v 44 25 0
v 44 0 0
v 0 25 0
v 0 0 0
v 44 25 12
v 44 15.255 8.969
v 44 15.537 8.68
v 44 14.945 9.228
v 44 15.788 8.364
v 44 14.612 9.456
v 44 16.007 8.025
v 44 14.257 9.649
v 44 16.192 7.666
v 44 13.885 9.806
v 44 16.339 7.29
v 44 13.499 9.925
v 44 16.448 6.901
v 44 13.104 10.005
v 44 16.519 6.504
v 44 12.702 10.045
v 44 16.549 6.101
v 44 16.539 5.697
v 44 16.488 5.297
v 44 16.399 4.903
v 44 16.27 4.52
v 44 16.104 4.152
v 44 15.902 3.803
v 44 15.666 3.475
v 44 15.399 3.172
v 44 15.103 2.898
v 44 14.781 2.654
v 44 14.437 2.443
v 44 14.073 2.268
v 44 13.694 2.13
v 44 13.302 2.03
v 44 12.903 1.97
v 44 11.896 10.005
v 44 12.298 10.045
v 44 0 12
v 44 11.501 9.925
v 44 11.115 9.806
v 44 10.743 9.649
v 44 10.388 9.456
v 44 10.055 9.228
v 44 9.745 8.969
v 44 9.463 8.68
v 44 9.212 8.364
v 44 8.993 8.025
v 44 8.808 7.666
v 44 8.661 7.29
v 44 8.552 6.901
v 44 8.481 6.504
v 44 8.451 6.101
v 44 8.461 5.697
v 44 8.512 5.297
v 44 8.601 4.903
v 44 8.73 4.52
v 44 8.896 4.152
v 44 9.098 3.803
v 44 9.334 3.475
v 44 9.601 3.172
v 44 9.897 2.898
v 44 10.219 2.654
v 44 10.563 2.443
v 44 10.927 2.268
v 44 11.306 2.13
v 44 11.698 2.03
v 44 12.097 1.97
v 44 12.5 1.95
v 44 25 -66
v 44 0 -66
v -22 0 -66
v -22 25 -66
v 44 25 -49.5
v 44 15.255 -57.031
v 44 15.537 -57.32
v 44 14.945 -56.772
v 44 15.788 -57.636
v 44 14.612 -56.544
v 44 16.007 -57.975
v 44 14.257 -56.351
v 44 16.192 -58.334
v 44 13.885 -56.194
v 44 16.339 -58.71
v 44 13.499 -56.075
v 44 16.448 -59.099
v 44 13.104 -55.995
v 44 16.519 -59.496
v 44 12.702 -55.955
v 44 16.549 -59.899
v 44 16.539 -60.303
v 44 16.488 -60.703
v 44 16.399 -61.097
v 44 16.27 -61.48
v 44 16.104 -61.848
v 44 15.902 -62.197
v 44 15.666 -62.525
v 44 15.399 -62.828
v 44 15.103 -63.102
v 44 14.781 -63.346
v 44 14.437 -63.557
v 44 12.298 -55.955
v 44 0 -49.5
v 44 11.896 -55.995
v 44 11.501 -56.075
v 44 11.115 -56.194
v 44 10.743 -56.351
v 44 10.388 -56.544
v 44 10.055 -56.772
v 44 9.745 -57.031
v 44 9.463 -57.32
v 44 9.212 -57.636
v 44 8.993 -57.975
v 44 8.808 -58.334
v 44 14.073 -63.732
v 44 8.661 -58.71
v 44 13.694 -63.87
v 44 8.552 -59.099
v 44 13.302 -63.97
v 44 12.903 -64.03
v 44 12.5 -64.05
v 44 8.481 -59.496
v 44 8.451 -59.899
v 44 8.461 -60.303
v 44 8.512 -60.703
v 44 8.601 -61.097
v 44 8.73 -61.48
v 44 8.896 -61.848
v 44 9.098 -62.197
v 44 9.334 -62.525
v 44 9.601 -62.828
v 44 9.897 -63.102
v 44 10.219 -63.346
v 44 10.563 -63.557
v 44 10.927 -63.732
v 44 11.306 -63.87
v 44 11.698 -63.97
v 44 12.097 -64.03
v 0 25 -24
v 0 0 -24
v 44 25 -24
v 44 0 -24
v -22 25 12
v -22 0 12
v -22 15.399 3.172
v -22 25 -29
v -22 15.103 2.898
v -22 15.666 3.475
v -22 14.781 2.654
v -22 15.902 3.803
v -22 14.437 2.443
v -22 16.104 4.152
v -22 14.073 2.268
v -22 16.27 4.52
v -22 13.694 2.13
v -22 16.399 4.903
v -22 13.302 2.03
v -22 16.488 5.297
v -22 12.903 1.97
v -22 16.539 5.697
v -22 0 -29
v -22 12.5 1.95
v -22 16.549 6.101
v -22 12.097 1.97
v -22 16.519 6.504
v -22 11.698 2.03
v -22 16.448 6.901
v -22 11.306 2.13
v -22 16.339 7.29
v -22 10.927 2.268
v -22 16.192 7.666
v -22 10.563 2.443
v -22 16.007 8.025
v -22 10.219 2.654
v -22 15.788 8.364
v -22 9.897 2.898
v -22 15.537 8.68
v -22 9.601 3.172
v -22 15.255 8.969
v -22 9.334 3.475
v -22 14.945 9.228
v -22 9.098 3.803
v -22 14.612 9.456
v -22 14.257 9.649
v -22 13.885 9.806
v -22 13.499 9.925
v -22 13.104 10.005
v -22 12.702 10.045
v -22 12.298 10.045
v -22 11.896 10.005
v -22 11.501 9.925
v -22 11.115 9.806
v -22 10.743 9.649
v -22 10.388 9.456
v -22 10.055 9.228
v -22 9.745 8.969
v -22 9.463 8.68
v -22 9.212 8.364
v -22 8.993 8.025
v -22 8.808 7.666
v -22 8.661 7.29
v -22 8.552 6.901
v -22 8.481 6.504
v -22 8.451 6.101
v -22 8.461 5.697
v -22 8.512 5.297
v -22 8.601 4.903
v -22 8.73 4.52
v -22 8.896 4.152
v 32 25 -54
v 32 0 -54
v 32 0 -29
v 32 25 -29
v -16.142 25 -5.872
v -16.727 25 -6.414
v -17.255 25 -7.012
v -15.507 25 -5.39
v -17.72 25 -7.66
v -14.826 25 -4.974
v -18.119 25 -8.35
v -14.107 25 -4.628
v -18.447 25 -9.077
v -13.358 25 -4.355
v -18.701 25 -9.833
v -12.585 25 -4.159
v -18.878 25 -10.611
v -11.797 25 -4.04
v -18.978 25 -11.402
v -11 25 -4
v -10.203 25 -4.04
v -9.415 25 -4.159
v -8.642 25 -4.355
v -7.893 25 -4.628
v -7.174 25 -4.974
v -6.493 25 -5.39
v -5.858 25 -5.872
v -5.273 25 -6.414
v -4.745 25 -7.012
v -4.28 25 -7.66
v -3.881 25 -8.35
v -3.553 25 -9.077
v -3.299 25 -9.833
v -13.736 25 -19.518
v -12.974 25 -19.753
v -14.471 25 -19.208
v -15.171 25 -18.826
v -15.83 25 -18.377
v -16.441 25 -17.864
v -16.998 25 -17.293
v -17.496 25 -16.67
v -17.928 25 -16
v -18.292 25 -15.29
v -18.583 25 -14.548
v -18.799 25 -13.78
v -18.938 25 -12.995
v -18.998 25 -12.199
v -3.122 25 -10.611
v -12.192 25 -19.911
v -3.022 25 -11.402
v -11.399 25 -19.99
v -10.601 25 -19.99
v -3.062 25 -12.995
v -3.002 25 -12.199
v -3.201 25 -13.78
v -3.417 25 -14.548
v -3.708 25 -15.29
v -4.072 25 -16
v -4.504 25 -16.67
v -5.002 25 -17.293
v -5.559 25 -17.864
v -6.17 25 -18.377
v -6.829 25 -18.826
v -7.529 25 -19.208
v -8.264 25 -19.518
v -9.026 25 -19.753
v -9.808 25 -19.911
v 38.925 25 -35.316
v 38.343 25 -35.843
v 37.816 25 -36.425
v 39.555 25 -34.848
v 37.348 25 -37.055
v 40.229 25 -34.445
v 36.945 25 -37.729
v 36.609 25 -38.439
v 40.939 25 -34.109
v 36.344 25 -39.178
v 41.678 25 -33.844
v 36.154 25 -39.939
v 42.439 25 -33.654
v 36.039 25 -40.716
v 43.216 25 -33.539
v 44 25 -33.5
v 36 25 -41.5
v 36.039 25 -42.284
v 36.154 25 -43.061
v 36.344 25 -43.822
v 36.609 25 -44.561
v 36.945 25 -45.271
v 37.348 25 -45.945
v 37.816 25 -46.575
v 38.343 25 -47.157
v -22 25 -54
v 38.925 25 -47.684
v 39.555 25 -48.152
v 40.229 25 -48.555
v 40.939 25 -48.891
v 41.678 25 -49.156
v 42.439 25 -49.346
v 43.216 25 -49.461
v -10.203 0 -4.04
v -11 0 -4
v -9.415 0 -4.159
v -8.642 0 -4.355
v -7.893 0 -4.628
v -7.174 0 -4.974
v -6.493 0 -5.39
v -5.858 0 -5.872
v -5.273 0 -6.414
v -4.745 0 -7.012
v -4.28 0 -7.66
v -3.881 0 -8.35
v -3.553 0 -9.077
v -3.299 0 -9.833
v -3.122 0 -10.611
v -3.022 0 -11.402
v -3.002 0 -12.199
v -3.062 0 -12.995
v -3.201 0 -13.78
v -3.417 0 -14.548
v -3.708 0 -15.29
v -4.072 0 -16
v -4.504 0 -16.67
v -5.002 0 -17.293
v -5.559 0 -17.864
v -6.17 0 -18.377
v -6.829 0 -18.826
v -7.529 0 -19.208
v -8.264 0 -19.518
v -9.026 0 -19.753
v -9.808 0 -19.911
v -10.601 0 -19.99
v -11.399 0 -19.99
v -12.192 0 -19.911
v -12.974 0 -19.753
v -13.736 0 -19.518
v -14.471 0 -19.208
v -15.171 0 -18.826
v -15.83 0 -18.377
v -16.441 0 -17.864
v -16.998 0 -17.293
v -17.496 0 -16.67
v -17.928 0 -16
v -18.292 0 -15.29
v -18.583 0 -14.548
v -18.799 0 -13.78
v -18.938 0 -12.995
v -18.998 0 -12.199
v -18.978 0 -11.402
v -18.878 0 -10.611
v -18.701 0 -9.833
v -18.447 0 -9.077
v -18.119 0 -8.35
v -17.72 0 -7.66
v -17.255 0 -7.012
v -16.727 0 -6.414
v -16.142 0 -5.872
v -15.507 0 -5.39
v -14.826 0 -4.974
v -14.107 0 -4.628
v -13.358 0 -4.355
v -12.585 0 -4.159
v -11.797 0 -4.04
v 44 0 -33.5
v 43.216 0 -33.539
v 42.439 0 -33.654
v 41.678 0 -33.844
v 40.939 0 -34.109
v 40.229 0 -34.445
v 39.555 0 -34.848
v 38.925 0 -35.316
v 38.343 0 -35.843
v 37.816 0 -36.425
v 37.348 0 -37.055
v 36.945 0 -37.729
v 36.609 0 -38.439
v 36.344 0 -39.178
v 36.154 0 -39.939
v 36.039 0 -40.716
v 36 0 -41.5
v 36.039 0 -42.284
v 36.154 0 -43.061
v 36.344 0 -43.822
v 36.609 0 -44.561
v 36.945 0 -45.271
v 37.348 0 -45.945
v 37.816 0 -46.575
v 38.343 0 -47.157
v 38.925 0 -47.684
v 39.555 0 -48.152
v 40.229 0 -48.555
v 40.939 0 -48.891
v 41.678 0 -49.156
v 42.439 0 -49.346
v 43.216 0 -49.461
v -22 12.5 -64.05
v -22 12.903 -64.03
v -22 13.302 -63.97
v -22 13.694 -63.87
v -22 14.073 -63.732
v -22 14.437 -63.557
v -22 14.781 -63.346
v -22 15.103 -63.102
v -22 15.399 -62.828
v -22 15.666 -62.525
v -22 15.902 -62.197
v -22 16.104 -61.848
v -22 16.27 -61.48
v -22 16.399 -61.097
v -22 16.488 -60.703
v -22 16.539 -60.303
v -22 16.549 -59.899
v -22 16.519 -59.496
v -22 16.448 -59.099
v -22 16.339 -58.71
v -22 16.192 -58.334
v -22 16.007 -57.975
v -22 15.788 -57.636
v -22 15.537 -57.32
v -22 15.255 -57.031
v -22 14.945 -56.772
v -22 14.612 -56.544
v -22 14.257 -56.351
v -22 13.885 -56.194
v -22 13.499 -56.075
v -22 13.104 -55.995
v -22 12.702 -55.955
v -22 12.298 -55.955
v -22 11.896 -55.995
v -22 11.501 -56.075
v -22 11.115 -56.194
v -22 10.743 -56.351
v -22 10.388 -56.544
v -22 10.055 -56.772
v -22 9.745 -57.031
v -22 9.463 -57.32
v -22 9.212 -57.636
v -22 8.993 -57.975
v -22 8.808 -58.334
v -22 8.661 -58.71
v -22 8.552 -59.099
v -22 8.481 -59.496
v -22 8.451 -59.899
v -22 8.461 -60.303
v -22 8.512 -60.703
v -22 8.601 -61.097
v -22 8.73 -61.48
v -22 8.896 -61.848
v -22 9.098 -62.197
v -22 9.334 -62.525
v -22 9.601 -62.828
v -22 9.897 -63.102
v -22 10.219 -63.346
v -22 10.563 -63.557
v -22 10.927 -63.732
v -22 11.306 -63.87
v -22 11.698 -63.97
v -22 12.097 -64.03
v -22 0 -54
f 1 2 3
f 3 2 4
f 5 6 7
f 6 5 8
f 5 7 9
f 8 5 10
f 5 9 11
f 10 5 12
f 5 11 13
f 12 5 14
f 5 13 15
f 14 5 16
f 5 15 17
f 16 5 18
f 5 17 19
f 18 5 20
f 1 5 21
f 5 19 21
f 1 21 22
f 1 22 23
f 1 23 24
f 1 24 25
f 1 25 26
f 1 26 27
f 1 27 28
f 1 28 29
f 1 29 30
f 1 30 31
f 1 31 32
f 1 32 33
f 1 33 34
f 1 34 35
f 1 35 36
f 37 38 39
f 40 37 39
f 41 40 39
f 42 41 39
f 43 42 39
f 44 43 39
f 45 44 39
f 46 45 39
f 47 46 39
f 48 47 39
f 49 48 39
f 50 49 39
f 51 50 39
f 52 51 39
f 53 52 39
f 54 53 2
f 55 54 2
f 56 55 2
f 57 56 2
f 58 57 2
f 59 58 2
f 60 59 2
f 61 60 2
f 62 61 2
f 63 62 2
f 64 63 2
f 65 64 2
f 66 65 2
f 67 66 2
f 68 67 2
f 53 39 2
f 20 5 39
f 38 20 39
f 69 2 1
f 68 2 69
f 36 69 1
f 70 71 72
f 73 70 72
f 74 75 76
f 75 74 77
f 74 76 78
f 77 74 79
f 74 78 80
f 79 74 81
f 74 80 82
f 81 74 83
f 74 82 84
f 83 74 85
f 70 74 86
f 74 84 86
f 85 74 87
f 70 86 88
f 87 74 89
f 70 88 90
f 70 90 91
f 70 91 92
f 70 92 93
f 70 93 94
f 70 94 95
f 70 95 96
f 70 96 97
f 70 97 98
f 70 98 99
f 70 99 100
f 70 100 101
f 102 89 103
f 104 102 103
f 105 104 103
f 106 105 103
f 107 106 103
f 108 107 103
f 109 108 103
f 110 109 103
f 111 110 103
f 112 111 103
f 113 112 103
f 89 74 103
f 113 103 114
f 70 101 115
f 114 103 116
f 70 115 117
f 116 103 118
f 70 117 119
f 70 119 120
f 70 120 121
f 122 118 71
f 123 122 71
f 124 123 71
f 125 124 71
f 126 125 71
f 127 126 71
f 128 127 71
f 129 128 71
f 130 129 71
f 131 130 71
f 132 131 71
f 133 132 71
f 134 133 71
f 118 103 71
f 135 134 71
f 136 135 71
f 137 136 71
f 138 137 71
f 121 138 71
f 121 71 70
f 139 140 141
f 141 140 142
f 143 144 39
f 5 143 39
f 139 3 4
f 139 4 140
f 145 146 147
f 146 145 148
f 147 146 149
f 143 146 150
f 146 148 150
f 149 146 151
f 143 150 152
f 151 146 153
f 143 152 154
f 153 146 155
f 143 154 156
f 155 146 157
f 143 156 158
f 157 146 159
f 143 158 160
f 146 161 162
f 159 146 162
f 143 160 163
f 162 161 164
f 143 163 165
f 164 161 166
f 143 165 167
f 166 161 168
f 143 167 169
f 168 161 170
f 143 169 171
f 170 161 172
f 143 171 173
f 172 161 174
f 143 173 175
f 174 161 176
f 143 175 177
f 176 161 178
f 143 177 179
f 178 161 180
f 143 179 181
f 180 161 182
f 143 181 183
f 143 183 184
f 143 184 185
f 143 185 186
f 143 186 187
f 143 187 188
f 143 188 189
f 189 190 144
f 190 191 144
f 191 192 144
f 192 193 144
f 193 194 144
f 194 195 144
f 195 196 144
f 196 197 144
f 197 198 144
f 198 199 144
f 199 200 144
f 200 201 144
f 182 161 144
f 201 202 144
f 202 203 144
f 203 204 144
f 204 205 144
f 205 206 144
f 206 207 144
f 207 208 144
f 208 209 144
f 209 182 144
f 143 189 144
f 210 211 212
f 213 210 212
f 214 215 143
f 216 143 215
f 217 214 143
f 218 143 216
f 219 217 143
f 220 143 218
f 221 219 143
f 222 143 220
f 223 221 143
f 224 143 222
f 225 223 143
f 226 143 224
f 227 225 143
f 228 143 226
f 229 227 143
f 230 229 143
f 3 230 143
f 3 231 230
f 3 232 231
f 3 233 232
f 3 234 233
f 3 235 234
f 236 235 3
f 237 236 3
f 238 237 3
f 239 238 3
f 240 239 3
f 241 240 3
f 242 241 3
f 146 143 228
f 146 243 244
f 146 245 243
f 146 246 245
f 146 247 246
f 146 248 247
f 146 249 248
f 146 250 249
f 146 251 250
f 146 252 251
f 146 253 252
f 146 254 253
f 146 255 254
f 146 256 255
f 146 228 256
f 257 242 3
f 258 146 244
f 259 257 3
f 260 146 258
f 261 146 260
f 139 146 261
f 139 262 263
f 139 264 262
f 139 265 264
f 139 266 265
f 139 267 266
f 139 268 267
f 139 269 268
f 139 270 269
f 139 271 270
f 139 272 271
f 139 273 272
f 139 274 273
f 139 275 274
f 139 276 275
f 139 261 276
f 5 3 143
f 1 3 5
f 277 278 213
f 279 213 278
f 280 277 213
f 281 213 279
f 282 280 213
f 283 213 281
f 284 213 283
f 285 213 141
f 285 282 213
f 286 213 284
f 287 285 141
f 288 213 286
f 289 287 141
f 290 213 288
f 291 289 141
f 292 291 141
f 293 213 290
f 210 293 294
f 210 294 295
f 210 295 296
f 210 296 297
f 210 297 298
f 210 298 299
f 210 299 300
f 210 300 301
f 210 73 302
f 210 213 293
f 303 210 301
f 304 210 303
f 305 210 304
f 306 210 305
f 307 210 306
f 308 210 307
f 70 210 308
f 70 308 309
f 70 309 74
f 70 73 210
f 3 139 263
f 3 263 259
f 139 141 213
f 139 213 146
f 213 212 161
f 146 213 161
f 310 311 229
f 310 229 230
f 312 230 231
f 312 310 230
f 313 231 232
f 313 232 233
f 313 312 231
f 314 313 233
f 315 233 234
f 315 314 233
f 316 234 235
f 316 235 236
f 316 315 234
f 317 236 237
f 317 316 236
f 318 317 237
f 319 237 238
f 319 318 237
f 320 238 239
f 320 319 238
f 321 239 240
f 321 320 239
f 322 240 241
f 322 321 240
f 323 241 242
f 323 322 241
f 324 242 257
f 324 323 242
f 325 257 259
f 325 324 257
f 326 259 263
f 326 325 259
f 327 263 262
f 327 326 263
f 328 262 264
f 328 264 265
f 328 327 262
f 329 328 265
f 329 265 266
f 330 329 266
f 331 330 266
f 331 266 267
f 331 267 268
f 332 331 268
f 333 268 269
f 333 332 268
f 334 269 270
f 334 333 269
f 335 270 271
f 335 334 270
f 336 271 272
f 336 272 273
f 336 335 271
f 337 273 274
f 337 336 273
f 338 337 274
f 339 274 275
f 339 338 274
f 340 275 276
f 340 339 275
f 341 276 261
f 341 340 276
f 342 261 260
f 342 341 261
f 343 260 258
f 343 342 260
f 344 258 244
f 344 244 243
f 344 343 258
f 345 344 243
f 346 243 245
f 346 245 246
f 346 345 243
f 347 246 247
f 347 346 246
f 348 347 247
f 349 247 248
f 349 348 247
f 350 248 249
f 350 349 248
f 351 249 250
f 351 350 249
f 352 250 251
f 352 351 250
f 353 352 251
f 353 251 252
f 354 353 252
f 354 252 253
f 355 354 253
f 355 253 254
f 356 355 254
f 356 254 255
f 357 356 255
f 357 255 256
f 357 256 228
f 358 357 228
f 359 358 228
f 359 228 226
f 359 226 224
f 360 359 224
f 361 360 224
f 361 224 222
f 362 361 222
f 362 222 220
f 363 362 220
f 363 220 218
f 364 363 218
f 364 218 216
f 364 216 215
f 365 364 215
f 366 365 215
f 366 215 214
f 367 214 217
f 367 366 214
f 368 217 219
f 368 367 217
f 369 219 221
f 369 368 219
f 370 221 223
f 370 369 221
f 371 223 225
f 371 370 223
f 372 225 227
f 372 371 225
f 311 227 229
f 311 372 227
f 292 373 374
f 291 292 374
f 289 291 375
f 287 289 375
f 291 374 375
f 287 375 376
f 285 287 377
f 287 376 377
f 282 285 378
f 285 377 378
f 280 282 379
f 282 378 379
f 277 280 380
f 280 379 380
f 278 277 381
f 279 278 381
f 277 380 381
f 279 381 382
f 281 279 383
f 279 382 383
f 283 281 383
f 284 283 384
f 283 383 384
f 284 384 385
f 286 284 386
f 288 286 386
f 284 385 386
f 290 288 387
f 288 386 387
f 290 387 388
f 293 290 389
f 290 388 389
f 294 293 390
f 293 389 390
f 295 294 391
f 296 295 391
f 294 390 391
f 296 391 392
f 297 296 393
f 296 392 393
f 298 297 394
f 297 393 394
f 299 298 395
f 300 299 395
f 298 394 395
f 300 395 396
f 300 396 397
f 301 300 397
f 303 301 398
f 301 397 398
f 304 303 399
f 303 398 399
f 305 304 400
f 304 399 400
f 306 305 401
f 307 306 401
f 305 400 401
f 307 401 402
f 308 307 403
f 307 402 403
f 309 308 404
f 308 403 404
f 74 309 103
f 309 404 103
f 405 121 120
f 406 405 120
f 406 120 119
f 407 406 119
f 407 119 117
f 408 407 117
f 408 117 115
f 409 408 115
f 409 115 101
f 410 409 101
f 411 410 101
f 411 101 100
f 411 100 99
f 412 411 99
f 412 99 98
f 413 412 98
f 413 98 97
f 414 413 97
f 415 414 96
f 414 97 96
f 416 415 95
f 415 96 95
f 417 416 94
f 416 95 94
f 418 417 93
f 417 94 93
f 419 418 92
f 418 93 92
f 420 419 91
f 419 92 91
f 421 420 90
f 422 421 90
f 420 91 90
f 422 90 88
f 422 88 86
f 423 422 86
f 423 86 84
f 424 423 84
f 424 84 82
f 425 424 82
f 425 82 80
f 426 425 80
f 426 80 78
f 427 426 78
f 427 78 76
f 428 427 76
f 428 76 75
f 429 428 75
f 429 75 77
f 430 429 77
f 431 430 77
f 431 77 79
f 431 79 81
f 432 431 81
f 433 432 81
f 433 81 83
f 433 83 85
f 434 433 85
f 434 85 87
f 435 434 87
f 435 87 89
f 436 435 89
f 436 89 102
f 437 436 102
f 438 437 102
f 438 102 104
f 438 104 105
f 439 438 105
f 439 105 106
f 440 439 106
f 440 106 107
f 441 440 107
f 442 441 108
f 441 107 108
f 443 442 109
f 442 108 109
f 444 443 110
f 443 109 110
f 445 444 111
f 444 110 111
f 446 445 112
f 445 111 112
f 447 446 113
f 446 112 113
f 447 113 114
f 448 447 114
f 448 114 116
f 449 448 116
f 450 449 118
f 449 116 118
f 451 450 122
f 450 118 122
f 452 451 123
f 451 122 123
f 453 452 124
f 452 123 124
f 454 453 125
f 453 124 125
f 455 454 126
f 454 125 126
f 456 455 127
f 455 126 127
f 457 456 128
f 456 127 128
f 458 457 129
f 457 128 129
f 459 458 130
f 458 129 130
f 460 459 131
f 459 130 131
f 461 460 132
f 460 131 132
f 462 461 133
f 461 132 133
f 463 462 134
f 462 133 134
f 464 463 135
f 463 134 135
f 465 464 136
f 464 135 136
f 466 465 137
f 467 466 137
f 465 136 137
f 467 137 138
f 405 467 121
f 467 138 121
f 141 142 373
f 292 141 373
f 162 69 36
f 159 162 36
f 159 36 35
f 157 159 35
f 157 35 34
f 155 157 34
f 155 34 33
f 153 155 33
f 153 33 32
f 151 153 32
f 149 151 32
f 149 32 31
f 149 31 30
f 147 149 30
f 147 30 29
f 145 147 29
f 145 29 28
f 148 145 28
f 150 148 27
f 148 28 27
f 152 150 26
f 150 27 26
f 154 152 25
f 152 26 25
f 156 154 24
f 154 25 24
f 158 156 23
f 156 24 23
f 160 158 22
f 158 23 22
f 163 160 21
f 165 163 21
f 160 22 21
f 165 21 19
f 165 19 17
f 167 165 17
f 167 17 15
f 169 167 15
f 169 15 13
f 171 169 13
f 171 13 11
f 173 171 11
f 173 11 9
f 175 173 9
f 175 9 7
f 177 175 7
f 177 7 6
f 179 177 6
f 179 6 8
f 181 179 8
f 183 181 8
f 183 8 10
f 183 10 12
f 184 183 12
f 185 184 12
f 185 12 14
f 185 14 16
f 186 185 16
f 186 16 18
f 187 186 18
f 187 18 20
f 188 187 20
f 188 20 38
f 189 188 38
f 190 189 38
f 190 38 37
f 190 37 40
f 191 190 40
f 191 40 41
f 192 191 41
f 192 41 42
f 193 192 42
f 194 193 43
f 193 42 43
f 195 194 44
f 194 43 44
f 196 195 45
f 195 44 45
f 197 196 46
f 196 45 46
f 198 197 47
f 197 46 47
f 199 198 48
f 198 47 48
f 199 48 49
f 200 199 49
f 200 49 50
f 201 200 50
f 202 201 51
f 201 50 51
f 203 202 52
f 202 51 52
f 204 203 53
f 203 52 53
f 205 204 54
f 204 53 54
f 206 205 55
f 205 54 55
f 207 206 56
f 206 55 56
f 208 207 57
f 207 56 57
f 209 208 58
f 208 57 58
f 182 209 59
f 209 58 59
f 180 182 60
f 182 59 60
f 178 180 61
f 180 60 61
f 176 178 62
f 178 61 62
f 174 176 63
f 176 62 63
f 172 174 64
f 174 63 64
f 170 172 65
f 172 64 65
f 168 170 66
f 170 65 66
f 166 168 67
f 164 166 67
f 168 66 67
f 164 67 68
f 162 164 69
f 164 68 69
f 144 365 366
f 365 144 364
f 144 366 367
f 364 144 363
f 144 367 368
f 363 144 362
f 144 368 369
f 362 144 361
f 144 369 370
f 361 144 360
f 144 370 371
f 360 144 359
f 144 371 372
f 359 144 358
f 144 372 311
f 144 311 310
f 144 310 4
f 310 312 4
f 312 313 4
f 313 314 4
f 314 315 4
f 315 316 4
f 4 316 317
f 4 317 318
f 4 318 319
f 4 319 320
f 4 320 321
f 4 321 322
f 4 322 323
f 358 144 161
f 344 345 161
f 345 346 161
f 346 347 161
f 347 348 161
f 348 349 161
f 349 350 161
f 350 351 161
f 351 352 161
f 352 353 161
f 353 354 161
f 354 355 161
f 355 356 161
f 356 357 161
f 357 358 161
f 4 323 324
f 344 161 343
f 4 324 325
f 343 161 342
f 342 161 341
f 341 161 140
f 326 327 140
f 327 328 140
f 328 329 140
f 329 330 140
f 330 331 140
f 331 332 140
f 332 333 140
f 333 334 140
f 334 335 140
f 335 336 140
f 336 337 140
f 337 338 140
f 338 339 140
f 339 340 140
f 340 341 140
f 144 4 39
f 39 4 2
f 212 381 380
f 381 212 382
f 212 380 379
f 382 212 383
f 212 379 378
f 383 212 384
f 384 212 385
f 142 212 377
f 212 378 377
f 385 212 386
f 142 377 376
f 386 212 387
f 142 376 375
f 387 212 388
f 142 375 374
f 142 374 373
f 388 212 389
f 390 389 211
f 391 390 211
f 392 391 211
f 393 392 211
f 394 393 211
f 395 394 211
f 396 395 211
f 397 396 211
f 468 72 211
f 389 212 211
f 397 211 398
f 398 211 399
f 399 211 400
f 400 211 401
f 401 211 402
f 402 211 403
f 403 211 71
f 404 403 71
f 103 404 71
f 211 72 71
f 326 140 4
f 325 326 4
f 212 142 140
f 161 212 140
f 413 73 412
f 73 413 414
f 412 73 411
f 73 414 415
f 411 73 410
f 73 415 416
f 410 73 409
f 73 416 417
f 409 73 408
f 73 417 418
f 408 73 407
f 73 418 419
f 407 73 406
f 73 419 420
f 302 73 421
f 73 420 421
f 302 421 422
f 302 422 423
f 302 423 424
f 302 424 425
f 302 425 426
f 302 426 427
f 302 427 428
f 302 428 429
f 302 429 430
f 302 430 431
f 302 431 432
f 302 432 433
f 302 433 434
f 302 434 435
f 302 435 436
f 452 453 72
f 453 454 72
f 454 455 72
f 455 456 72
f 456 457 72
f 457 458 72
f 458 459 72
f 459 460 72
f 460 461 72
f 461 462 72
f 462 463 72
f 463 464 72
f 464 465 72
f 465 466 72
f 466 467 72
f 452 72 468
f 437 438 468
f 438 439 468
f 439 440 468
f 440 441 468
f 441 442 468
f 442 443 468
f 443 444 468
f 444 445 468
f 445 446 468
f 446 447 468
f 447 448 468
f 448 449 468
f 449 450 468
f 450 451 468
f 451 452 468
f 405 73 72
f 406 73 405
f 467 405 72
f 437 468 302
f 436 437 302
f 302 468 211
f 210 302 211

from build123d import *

# Parameters (mm, degrees)
SKETCH1_R           = 8
BOSS_EXTRUDE1_DEPTH = 25
SKETCH2_R           = 4.05
CUT_EXTRUDE1_DEPTH  = 76


with BuildPart() as part:
    # Sketch1 → Boss-Extrude1 (new body)
    with BuildSketch(Plane(origin=(0, 0, 0), x_dir=(1, 0, 0), z_dir=(0, 1, 0))):
        with BuildLine():
            Line((0, 0), (0, 24))
            Line((0, 24), (44, 24))
            Line((44, 24), (44, 33.5))
            ThreePointArc((44, 33.5), (36, 41.5), (44, 49.5))
            Line((44, 49.5), (44, 54))
            Line((44, 54), (44, 66))
            Line((44, 66), (-22, 66))
            Line((-22, 66), (-22, 54))
            Line((-22, 54), (32, 54))
            Line((32, 54), (32, 29))
            Line((32, 29), (-22, 29))
            Line((-22, 29), (-22, -12))
            Line((-22, -12), (44, -12))
            Line((44, -12), (44, 0))
            Line((44, 0), (0, 0))
        make_face()
        with Locations(Location((-11, 12, 0), (0, 0, 270))):
            Circle(SKETCH1_R, mode=Mode.SUBTRACT)
    extrude(amount=BOSS_EXTRUDE1_DEPTH)

    # Sketch2 → Cut-Extrude1 (cut)
    with BuildSketch(Plane(origin=(44, 0, 0), x_dir=(0, 0, -1), z_dir=(1, 0, 0))):
        with Locations((-6, 12.5)):
            Circle(SKETCH2_R)
        with Locations((60, 12.5)):
            Circle(SKETCH2_R)
    extrude(amount=-CUT_EXTRUDE1_DEPTH, mode=Mode.SUBTRACT)


solid = part.part
